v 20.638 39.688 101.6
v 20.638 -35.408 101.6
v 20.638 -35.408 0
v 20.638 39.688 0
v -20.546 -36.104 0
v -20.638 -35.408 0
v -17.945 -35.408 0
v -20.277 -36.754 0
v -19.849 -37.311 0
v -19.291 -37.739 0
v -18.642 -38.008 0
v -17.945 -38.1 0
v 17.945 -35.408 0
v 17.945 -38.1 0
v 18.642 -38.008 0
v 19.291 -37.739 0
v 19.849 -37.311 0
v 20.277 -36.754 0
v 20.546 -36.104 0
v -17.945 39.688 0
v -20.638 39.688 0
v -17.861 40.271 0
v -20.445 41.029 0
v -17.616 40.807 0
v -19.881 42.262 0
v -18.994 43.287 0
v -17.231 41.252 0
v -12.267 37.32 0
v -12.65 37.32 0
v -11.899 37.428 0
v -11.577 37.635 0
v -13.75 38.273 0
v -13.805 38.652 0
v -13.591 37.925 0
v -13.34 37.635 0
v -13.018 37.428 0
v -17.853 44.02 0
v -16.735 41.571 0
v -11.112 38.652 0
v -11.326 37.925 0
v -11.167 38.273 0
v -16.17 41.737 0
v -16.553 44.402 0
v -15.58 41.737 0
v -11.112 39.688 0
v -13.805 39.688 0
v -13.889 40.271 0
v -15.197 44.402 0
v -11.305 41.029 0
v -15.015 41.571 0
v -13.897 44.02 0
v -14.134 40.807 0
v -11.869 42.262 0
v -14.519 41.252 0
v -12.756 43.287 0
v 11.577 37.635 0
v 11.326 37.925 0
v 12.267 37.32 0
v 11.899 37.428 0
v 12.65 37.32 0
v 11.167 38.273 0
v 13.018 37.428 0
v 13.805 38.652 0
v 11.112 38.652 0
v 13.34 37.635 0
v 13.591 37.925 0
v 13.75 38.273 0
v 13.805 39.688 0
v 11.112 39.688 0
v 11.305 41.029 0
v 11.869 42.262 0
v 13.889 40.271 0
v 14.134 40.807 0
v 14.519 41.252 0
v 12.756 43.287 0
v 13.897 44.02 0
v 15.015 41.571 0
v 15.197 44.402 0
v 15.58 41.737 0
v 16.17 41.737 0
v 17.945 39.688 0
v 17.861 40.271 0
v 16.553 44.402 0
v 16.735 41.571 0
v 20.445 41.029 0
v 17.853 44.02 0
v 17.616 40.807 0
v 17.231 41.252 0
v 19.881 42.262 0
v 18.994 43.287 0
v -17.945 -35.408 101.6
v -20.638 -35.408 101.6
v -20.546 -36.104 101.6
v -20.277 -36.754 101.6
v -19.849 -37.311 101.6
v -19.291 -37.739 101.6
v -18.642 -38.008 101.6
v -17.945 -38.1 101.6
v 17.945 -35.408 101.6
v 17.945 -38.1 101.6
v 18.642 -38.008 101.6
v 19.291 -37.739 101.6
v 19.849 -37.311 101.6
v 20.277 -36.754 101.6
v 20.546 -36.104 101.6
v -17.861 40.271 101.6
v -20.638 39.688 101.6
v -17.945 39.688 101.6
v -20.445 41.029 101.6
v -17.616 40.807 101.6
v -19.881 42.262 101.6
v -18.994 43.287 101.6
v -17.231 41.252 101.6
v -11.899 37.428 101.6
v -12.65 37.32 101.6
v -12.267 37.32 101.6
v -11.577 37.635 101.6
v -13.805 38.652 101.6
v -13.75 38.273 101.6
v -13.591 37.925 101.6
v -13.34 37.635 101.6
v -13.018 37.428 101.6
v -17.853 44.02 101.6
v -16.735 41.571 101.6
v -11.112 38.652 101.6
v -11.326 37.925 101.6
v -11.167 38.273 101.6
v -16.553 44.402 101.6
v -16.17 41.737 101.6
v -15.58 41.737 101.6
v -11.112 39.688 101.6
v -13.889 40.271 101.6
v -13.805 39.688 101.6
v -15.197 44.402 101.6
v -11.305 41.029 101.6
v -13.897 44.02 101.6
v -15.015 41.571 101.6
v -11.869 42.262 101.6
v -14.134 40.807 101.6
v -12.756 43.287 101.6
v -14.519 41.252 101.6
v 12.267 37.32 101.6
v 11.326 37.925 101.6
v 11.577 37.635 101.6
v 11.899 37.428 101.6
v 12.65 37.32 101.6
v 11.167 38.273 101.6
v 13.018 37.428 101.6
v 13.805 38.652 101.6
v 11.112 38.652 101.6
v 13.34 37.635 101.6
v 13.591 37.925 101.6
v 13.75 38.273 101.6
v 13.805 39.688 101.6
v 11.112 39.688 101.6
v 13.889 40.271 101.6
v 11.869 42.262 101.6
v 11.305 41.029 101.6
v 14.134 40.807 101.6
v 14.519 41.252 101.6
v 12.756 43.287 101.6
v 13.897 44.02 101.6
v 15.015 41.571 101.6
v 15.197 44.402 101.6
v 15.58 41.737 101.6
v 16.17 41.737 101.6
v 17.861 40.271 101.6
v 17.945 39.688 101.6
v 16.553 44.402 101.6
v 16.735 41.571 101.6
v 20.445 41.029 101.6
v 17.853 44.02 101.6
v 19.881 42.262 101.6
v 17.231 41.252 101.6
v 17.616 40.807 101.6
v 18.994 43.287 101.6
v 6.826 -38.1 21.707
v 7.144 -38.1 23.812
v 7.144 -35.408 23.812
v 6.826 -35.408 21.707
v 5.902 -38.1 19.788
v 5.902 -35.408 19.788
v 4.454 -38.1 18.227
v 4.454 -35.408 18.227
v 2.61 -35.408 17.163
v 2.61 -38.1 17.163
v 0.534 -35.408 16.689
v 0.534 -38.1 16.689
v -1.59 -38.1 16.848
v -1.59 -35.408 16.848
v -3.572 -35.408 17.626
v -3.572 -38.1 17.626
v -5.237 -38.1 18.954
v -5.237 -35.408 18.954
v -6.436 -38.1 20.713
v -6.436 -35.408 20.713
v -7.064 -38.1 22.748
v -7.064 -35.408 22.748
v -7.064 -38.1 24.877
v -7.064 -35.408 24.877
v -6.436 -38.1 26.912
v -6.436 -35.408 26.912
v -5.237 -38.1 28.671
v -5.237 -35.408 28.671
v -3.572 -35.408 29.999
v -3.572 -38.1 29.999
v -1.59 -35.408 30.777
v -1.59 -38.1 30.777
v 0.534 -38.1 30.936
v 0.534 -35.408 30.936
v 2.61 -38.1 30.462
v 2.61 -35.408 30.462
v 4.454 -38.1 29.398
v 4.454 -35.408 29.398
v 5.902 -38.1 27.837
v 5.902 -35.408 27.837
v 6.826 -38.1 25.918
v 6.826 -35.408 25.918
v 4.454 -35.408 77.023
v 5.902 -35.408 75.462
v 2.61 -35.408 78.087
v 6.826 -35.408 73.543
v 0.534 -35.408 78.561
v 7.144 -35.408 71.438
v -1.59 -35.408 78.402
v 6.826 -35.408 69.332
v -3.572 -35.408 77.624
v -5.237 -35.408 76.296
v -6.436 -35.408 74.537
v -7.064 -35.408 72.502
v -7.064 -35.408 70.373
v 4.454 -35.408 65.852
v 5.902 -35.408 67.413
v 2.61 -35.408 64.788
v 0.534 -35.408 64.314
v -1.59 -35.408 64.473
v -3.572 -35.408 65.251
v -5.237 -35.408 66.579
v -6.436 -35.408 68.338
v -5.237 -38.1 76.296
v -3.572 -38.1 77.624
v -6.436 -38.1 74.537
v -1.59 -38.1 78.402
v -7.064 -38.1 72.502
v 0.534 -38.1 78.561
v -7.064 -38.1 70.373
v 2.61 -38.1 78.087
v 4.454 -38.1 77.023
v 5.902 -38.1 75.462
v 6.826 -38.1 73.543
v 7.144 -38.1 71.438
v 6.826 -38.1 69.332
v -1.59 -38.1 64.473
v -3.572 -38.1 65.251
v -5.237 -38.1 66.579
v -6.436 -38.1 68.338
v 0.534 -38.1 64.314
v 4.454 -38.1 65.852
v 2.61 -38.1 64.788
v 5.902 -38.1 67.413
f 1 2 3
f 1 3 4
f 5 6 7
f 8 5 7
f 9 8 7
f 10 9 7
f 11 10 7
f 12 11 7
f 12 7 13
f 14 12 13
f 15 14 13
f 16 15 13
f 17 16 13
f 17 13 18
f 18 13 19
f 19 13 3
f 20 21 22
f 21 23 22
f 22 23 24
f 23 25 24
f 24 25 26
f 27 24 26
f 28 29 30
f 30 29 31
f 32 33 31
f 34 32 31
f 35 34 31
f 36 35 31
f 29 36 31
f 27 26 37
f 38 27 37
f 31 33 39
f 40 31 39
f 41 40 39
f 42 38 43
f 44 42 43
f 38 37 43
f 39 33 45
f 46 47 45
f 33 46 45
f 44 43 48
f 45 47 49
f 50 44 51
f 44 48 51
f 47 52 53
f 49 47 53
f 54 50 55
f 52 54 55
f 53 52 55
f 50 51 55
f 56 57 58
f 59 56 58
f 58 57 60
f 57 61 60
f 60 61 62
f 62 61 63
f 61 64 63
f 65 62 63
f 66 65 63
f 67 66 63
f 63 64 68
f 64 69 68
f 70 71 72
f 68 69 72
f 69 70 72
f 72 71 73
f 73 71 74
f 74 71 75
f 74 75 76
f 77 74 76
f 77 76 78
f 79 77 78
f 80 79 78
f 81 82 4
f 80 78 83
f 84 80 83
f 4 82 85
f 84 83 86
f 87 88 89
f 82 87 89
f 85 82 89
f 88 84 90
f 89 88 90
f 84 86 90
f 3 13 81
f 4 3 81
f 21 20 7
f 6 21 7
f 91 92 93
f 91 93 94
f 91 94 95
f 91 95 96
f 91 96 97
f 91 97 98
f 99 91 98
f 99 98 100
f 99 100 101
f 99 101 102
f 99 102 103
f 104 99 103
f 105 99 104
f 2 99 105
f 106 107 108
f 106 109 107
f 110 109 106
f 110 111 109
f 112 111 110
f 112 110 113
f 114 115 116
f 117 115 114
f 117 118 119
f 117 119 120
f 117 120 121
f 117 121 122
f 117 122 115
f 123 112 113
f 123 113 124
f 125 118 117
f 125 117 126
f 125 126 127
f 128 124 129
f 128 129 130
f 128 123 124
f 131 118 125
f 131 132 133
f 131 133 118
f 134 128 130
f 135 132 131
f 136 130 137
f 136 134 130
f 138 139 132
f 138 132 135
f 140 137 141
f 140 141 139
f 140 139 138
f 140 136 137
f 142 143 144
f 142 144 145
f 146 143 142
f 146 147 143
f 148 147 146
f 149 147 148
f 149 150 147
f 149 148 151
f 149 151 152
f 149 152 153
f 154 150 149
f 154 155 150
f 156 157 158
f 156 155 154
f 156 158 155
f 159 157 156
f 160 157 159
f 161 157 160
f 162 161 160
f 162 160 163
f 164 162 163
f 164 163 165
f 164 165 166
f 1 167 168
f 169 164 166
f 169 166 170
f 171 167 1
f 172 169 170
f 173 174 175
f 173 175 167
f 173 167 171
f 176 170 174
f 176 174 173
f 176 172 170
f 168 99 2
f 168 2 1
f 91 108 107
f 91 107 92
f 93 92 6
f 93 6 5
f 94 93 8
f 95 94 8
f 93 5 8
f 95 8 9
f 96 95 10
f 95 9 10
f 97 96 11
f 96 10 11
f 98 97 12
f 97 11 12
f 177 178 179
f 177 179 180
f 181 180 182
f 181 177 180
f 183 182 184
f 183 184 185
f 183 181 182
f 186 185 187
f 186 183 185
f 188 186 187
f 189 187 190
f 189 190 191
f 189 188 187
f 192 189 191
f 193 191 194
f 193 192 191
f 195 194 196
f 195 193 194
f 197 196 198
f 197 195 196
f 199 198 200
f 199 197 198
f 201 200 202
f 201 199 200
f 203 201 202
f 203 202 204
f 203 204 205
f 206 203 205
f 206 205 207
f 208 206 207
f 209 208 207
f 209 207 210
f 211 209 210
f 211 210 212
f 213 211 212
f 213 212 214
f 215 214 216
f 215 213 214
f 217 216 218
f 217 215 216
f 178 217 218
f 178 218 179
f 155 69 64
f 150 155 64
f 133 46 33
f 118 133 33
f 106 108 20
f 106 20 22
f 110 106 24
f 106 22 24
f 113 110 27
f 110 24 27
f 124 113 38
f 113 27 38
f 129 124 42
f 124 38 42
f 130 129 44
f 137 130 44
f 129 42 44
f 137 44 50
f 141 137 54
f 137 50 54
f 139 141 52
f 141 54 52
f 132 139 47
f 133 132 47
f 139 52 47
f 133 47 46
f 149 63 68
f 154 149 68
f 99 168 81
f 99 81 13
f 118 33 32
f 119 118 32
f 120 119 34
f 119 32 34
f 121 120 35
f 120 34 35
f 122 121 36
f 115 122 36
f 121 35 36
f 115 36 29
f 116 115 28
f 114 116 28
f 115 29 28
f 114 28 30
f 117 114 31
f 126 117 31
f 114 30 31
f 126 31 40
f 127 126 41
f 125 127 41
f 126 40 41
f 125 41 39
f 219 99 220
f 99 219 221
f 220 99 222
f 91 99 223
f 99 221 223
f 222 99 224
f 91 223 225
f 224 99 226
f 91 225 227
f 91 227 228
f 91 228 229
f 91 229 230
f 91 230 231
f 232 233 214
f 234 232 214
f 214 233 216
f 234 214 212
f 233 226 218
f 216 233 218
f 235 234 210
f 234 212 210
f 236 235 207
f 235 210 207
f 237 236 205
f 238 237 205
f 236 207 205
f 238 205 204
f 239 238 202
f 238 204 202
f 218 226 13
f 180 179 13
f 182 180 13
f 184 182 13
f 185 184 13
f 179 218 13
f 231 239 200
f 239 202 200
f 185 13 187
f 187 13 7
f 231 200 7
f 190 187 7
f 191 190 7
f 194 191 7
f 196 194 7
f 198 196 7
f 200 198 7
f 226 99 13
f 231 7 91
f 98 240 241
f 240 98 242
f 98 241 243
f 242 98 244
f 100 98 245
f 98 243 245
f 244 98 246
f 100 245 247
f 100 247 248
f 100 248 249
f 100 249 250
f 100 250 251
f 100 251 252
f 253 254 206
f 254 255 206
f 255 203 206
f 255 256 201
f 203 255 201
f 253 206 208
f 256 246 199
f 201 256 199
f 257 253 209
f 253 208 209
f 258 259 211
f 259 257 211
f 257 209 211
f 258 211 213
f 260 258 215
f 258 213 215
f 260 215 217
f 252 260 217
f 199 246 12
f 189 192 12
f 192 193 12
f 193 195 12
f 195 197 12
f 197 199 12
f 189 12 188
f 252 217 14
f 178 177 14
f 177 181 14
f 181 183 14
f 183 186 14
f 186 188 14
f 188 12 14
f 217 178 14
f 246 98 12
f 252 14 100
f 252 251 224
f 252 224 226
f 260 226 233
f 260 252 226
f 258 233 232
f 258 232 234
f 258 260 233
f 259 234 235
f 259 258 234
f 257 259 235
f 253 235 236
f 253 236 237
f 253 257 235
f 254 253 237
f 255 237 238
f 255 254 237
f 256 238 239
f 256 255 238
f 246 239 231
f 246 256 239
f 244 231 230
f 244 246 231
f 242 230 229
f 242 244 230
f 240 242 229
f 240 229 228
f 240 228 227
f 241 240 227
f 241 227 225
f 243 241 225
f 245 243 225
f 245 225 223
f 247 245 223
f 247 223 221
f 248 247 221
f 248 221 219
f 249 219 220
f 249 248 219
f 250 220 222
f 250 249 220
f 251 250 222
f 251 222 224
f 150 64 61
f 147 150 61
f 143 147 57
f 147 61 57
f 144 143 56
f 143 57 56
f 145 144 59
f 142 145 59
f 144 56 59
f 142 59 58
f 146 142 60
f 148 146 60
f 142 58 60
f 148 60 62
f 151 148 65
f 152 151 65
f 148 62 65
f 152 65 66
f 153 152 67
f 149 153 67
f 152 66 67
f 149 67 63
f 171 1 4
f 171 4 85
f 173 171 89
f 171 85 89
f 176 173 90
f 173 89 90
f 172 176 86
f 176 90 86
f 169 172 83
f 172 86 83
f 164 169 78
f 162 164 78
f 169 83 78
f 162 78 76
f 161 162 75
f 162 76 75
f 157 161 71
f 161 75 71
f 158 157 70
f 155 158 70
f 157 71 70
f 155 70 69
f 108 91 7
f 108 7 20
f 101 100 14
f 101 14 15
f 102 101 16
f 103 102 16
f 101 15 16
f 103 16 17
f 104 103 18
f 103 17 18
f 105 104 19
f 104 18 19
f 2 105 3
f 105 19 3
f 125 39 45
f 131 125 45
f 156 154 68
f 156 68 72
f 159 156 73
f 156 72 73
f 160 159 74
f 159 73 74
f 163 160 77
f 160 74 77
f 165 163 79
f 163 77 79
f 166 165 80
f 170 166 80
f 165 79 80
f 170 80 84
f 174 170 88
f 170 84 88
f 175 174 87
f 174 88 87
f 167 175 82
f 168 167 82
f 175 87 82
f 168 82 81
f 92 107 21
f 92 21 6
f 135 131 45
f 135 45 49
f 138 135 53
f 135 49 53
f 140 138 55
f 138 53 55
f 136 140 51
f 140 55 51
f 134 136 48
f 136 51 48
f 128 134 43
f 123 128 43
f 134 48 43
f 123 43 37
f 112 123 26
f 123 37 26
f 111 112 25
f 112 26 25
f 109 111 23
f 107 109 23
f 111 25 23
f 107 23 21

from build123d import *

# Parameters (mm, degrees)
BASE_EXTRUDE_DEPTH = 101.6
HOLE1_START        = -38.1
HOLE1_OUTLINE_R    = 7.14375
HOLE1_DEPTH        = 2.6924
LPATTERN2_COUNT    = 2
LPATTERN2_PITCH    = 47.625


# Read off the part's stored shape, not the designer's step: Hole1
with BuildPart() as part:
    # Sketch1 → Base-Extrude (new body)
    with BuildSketch(Plane.XY):
        with BuildLine():
            Line((-20.6375, 39.6875), (-20.6375, -35.4076))
            ThreePointArc((-20.6375, -35.4076), (-19.848914298, -37.311414298), (-17.9451, -38.1))
            Line((-17.9451, -38.1), (17.9451, -38.1))
            ThreePointArc((17.9451, -38.1), (19.848914298, -37.311414298), (20.6375, -35.4076))
            Line((20.6375, -35.4076), (20.6375, 39.6875))
            ThreePointArc((20.6375, 39.6875), (15.875, 44.45), (11.1125, 39.6875))
            Line((11.1125, 39.6875), (11.1125, 38.65245))
            ThreePointArc((11.1125, 38.65245), (12.4587, 37.30625), (13.8049, 38.65245))
            Line((13.8049, 38.65245), (13.8049, 39.6875))
            ThreePointArc((13.8049, 39.6875), (15.875, 41.7576), (17.9451, 39.6875))
            Line((17.9451, 39.6875), (17.9451, -35.4076))
            Line((17.9451, -35.4076), (-17.9451, -35.4076))
            Line((-17.9451, -35.4076), (-17.9451, 39.6875))
            ThreePointArc((-17.9451, 39.6875), (-15.875, 41.7576), (-13.8049, 39.6875))
            Line((-13.8049, 39.6875), (-13.8049, 38.65245))
            ThreePointArc((-13.8049, 38.65245), (-12.4587, 37.30625), (-11.1125, 38.65245))
            Line((-11.1125, 38.65245), (-11.1125, 39.6875))
            ThreePointArc((-11.1125, 39.6875), (-15.875, 44.45), (-20.6375, 39.6875))
        make_face()
    extrude(amount=BASE_EXTRUDE_DEPTH)

    # Hole1 outline → Hole1 (cut)
    with BuildSketch(Plane(origin=(0, 0, 0), x_dir=(1, 0, 0), z_dir=(0, 1, 0)).offset(HOLE1_START)):
        with Locations((0, -23.8125)):
            Circle(HOLE1_OUTLINE_R)
    hole1 = extrude(amount=HOLE1_DEPTH, mode=Mode.SUBTRACT)

    # LPattern2: Hole1 ×2
    with Locations(*[(0, 0, i * LPATTERN2_PITCH) for i in range(1, LPATTERN2_COUNT)]):
        add(hole1, mode=Mode.SUBTRACT)


solid = part.part
